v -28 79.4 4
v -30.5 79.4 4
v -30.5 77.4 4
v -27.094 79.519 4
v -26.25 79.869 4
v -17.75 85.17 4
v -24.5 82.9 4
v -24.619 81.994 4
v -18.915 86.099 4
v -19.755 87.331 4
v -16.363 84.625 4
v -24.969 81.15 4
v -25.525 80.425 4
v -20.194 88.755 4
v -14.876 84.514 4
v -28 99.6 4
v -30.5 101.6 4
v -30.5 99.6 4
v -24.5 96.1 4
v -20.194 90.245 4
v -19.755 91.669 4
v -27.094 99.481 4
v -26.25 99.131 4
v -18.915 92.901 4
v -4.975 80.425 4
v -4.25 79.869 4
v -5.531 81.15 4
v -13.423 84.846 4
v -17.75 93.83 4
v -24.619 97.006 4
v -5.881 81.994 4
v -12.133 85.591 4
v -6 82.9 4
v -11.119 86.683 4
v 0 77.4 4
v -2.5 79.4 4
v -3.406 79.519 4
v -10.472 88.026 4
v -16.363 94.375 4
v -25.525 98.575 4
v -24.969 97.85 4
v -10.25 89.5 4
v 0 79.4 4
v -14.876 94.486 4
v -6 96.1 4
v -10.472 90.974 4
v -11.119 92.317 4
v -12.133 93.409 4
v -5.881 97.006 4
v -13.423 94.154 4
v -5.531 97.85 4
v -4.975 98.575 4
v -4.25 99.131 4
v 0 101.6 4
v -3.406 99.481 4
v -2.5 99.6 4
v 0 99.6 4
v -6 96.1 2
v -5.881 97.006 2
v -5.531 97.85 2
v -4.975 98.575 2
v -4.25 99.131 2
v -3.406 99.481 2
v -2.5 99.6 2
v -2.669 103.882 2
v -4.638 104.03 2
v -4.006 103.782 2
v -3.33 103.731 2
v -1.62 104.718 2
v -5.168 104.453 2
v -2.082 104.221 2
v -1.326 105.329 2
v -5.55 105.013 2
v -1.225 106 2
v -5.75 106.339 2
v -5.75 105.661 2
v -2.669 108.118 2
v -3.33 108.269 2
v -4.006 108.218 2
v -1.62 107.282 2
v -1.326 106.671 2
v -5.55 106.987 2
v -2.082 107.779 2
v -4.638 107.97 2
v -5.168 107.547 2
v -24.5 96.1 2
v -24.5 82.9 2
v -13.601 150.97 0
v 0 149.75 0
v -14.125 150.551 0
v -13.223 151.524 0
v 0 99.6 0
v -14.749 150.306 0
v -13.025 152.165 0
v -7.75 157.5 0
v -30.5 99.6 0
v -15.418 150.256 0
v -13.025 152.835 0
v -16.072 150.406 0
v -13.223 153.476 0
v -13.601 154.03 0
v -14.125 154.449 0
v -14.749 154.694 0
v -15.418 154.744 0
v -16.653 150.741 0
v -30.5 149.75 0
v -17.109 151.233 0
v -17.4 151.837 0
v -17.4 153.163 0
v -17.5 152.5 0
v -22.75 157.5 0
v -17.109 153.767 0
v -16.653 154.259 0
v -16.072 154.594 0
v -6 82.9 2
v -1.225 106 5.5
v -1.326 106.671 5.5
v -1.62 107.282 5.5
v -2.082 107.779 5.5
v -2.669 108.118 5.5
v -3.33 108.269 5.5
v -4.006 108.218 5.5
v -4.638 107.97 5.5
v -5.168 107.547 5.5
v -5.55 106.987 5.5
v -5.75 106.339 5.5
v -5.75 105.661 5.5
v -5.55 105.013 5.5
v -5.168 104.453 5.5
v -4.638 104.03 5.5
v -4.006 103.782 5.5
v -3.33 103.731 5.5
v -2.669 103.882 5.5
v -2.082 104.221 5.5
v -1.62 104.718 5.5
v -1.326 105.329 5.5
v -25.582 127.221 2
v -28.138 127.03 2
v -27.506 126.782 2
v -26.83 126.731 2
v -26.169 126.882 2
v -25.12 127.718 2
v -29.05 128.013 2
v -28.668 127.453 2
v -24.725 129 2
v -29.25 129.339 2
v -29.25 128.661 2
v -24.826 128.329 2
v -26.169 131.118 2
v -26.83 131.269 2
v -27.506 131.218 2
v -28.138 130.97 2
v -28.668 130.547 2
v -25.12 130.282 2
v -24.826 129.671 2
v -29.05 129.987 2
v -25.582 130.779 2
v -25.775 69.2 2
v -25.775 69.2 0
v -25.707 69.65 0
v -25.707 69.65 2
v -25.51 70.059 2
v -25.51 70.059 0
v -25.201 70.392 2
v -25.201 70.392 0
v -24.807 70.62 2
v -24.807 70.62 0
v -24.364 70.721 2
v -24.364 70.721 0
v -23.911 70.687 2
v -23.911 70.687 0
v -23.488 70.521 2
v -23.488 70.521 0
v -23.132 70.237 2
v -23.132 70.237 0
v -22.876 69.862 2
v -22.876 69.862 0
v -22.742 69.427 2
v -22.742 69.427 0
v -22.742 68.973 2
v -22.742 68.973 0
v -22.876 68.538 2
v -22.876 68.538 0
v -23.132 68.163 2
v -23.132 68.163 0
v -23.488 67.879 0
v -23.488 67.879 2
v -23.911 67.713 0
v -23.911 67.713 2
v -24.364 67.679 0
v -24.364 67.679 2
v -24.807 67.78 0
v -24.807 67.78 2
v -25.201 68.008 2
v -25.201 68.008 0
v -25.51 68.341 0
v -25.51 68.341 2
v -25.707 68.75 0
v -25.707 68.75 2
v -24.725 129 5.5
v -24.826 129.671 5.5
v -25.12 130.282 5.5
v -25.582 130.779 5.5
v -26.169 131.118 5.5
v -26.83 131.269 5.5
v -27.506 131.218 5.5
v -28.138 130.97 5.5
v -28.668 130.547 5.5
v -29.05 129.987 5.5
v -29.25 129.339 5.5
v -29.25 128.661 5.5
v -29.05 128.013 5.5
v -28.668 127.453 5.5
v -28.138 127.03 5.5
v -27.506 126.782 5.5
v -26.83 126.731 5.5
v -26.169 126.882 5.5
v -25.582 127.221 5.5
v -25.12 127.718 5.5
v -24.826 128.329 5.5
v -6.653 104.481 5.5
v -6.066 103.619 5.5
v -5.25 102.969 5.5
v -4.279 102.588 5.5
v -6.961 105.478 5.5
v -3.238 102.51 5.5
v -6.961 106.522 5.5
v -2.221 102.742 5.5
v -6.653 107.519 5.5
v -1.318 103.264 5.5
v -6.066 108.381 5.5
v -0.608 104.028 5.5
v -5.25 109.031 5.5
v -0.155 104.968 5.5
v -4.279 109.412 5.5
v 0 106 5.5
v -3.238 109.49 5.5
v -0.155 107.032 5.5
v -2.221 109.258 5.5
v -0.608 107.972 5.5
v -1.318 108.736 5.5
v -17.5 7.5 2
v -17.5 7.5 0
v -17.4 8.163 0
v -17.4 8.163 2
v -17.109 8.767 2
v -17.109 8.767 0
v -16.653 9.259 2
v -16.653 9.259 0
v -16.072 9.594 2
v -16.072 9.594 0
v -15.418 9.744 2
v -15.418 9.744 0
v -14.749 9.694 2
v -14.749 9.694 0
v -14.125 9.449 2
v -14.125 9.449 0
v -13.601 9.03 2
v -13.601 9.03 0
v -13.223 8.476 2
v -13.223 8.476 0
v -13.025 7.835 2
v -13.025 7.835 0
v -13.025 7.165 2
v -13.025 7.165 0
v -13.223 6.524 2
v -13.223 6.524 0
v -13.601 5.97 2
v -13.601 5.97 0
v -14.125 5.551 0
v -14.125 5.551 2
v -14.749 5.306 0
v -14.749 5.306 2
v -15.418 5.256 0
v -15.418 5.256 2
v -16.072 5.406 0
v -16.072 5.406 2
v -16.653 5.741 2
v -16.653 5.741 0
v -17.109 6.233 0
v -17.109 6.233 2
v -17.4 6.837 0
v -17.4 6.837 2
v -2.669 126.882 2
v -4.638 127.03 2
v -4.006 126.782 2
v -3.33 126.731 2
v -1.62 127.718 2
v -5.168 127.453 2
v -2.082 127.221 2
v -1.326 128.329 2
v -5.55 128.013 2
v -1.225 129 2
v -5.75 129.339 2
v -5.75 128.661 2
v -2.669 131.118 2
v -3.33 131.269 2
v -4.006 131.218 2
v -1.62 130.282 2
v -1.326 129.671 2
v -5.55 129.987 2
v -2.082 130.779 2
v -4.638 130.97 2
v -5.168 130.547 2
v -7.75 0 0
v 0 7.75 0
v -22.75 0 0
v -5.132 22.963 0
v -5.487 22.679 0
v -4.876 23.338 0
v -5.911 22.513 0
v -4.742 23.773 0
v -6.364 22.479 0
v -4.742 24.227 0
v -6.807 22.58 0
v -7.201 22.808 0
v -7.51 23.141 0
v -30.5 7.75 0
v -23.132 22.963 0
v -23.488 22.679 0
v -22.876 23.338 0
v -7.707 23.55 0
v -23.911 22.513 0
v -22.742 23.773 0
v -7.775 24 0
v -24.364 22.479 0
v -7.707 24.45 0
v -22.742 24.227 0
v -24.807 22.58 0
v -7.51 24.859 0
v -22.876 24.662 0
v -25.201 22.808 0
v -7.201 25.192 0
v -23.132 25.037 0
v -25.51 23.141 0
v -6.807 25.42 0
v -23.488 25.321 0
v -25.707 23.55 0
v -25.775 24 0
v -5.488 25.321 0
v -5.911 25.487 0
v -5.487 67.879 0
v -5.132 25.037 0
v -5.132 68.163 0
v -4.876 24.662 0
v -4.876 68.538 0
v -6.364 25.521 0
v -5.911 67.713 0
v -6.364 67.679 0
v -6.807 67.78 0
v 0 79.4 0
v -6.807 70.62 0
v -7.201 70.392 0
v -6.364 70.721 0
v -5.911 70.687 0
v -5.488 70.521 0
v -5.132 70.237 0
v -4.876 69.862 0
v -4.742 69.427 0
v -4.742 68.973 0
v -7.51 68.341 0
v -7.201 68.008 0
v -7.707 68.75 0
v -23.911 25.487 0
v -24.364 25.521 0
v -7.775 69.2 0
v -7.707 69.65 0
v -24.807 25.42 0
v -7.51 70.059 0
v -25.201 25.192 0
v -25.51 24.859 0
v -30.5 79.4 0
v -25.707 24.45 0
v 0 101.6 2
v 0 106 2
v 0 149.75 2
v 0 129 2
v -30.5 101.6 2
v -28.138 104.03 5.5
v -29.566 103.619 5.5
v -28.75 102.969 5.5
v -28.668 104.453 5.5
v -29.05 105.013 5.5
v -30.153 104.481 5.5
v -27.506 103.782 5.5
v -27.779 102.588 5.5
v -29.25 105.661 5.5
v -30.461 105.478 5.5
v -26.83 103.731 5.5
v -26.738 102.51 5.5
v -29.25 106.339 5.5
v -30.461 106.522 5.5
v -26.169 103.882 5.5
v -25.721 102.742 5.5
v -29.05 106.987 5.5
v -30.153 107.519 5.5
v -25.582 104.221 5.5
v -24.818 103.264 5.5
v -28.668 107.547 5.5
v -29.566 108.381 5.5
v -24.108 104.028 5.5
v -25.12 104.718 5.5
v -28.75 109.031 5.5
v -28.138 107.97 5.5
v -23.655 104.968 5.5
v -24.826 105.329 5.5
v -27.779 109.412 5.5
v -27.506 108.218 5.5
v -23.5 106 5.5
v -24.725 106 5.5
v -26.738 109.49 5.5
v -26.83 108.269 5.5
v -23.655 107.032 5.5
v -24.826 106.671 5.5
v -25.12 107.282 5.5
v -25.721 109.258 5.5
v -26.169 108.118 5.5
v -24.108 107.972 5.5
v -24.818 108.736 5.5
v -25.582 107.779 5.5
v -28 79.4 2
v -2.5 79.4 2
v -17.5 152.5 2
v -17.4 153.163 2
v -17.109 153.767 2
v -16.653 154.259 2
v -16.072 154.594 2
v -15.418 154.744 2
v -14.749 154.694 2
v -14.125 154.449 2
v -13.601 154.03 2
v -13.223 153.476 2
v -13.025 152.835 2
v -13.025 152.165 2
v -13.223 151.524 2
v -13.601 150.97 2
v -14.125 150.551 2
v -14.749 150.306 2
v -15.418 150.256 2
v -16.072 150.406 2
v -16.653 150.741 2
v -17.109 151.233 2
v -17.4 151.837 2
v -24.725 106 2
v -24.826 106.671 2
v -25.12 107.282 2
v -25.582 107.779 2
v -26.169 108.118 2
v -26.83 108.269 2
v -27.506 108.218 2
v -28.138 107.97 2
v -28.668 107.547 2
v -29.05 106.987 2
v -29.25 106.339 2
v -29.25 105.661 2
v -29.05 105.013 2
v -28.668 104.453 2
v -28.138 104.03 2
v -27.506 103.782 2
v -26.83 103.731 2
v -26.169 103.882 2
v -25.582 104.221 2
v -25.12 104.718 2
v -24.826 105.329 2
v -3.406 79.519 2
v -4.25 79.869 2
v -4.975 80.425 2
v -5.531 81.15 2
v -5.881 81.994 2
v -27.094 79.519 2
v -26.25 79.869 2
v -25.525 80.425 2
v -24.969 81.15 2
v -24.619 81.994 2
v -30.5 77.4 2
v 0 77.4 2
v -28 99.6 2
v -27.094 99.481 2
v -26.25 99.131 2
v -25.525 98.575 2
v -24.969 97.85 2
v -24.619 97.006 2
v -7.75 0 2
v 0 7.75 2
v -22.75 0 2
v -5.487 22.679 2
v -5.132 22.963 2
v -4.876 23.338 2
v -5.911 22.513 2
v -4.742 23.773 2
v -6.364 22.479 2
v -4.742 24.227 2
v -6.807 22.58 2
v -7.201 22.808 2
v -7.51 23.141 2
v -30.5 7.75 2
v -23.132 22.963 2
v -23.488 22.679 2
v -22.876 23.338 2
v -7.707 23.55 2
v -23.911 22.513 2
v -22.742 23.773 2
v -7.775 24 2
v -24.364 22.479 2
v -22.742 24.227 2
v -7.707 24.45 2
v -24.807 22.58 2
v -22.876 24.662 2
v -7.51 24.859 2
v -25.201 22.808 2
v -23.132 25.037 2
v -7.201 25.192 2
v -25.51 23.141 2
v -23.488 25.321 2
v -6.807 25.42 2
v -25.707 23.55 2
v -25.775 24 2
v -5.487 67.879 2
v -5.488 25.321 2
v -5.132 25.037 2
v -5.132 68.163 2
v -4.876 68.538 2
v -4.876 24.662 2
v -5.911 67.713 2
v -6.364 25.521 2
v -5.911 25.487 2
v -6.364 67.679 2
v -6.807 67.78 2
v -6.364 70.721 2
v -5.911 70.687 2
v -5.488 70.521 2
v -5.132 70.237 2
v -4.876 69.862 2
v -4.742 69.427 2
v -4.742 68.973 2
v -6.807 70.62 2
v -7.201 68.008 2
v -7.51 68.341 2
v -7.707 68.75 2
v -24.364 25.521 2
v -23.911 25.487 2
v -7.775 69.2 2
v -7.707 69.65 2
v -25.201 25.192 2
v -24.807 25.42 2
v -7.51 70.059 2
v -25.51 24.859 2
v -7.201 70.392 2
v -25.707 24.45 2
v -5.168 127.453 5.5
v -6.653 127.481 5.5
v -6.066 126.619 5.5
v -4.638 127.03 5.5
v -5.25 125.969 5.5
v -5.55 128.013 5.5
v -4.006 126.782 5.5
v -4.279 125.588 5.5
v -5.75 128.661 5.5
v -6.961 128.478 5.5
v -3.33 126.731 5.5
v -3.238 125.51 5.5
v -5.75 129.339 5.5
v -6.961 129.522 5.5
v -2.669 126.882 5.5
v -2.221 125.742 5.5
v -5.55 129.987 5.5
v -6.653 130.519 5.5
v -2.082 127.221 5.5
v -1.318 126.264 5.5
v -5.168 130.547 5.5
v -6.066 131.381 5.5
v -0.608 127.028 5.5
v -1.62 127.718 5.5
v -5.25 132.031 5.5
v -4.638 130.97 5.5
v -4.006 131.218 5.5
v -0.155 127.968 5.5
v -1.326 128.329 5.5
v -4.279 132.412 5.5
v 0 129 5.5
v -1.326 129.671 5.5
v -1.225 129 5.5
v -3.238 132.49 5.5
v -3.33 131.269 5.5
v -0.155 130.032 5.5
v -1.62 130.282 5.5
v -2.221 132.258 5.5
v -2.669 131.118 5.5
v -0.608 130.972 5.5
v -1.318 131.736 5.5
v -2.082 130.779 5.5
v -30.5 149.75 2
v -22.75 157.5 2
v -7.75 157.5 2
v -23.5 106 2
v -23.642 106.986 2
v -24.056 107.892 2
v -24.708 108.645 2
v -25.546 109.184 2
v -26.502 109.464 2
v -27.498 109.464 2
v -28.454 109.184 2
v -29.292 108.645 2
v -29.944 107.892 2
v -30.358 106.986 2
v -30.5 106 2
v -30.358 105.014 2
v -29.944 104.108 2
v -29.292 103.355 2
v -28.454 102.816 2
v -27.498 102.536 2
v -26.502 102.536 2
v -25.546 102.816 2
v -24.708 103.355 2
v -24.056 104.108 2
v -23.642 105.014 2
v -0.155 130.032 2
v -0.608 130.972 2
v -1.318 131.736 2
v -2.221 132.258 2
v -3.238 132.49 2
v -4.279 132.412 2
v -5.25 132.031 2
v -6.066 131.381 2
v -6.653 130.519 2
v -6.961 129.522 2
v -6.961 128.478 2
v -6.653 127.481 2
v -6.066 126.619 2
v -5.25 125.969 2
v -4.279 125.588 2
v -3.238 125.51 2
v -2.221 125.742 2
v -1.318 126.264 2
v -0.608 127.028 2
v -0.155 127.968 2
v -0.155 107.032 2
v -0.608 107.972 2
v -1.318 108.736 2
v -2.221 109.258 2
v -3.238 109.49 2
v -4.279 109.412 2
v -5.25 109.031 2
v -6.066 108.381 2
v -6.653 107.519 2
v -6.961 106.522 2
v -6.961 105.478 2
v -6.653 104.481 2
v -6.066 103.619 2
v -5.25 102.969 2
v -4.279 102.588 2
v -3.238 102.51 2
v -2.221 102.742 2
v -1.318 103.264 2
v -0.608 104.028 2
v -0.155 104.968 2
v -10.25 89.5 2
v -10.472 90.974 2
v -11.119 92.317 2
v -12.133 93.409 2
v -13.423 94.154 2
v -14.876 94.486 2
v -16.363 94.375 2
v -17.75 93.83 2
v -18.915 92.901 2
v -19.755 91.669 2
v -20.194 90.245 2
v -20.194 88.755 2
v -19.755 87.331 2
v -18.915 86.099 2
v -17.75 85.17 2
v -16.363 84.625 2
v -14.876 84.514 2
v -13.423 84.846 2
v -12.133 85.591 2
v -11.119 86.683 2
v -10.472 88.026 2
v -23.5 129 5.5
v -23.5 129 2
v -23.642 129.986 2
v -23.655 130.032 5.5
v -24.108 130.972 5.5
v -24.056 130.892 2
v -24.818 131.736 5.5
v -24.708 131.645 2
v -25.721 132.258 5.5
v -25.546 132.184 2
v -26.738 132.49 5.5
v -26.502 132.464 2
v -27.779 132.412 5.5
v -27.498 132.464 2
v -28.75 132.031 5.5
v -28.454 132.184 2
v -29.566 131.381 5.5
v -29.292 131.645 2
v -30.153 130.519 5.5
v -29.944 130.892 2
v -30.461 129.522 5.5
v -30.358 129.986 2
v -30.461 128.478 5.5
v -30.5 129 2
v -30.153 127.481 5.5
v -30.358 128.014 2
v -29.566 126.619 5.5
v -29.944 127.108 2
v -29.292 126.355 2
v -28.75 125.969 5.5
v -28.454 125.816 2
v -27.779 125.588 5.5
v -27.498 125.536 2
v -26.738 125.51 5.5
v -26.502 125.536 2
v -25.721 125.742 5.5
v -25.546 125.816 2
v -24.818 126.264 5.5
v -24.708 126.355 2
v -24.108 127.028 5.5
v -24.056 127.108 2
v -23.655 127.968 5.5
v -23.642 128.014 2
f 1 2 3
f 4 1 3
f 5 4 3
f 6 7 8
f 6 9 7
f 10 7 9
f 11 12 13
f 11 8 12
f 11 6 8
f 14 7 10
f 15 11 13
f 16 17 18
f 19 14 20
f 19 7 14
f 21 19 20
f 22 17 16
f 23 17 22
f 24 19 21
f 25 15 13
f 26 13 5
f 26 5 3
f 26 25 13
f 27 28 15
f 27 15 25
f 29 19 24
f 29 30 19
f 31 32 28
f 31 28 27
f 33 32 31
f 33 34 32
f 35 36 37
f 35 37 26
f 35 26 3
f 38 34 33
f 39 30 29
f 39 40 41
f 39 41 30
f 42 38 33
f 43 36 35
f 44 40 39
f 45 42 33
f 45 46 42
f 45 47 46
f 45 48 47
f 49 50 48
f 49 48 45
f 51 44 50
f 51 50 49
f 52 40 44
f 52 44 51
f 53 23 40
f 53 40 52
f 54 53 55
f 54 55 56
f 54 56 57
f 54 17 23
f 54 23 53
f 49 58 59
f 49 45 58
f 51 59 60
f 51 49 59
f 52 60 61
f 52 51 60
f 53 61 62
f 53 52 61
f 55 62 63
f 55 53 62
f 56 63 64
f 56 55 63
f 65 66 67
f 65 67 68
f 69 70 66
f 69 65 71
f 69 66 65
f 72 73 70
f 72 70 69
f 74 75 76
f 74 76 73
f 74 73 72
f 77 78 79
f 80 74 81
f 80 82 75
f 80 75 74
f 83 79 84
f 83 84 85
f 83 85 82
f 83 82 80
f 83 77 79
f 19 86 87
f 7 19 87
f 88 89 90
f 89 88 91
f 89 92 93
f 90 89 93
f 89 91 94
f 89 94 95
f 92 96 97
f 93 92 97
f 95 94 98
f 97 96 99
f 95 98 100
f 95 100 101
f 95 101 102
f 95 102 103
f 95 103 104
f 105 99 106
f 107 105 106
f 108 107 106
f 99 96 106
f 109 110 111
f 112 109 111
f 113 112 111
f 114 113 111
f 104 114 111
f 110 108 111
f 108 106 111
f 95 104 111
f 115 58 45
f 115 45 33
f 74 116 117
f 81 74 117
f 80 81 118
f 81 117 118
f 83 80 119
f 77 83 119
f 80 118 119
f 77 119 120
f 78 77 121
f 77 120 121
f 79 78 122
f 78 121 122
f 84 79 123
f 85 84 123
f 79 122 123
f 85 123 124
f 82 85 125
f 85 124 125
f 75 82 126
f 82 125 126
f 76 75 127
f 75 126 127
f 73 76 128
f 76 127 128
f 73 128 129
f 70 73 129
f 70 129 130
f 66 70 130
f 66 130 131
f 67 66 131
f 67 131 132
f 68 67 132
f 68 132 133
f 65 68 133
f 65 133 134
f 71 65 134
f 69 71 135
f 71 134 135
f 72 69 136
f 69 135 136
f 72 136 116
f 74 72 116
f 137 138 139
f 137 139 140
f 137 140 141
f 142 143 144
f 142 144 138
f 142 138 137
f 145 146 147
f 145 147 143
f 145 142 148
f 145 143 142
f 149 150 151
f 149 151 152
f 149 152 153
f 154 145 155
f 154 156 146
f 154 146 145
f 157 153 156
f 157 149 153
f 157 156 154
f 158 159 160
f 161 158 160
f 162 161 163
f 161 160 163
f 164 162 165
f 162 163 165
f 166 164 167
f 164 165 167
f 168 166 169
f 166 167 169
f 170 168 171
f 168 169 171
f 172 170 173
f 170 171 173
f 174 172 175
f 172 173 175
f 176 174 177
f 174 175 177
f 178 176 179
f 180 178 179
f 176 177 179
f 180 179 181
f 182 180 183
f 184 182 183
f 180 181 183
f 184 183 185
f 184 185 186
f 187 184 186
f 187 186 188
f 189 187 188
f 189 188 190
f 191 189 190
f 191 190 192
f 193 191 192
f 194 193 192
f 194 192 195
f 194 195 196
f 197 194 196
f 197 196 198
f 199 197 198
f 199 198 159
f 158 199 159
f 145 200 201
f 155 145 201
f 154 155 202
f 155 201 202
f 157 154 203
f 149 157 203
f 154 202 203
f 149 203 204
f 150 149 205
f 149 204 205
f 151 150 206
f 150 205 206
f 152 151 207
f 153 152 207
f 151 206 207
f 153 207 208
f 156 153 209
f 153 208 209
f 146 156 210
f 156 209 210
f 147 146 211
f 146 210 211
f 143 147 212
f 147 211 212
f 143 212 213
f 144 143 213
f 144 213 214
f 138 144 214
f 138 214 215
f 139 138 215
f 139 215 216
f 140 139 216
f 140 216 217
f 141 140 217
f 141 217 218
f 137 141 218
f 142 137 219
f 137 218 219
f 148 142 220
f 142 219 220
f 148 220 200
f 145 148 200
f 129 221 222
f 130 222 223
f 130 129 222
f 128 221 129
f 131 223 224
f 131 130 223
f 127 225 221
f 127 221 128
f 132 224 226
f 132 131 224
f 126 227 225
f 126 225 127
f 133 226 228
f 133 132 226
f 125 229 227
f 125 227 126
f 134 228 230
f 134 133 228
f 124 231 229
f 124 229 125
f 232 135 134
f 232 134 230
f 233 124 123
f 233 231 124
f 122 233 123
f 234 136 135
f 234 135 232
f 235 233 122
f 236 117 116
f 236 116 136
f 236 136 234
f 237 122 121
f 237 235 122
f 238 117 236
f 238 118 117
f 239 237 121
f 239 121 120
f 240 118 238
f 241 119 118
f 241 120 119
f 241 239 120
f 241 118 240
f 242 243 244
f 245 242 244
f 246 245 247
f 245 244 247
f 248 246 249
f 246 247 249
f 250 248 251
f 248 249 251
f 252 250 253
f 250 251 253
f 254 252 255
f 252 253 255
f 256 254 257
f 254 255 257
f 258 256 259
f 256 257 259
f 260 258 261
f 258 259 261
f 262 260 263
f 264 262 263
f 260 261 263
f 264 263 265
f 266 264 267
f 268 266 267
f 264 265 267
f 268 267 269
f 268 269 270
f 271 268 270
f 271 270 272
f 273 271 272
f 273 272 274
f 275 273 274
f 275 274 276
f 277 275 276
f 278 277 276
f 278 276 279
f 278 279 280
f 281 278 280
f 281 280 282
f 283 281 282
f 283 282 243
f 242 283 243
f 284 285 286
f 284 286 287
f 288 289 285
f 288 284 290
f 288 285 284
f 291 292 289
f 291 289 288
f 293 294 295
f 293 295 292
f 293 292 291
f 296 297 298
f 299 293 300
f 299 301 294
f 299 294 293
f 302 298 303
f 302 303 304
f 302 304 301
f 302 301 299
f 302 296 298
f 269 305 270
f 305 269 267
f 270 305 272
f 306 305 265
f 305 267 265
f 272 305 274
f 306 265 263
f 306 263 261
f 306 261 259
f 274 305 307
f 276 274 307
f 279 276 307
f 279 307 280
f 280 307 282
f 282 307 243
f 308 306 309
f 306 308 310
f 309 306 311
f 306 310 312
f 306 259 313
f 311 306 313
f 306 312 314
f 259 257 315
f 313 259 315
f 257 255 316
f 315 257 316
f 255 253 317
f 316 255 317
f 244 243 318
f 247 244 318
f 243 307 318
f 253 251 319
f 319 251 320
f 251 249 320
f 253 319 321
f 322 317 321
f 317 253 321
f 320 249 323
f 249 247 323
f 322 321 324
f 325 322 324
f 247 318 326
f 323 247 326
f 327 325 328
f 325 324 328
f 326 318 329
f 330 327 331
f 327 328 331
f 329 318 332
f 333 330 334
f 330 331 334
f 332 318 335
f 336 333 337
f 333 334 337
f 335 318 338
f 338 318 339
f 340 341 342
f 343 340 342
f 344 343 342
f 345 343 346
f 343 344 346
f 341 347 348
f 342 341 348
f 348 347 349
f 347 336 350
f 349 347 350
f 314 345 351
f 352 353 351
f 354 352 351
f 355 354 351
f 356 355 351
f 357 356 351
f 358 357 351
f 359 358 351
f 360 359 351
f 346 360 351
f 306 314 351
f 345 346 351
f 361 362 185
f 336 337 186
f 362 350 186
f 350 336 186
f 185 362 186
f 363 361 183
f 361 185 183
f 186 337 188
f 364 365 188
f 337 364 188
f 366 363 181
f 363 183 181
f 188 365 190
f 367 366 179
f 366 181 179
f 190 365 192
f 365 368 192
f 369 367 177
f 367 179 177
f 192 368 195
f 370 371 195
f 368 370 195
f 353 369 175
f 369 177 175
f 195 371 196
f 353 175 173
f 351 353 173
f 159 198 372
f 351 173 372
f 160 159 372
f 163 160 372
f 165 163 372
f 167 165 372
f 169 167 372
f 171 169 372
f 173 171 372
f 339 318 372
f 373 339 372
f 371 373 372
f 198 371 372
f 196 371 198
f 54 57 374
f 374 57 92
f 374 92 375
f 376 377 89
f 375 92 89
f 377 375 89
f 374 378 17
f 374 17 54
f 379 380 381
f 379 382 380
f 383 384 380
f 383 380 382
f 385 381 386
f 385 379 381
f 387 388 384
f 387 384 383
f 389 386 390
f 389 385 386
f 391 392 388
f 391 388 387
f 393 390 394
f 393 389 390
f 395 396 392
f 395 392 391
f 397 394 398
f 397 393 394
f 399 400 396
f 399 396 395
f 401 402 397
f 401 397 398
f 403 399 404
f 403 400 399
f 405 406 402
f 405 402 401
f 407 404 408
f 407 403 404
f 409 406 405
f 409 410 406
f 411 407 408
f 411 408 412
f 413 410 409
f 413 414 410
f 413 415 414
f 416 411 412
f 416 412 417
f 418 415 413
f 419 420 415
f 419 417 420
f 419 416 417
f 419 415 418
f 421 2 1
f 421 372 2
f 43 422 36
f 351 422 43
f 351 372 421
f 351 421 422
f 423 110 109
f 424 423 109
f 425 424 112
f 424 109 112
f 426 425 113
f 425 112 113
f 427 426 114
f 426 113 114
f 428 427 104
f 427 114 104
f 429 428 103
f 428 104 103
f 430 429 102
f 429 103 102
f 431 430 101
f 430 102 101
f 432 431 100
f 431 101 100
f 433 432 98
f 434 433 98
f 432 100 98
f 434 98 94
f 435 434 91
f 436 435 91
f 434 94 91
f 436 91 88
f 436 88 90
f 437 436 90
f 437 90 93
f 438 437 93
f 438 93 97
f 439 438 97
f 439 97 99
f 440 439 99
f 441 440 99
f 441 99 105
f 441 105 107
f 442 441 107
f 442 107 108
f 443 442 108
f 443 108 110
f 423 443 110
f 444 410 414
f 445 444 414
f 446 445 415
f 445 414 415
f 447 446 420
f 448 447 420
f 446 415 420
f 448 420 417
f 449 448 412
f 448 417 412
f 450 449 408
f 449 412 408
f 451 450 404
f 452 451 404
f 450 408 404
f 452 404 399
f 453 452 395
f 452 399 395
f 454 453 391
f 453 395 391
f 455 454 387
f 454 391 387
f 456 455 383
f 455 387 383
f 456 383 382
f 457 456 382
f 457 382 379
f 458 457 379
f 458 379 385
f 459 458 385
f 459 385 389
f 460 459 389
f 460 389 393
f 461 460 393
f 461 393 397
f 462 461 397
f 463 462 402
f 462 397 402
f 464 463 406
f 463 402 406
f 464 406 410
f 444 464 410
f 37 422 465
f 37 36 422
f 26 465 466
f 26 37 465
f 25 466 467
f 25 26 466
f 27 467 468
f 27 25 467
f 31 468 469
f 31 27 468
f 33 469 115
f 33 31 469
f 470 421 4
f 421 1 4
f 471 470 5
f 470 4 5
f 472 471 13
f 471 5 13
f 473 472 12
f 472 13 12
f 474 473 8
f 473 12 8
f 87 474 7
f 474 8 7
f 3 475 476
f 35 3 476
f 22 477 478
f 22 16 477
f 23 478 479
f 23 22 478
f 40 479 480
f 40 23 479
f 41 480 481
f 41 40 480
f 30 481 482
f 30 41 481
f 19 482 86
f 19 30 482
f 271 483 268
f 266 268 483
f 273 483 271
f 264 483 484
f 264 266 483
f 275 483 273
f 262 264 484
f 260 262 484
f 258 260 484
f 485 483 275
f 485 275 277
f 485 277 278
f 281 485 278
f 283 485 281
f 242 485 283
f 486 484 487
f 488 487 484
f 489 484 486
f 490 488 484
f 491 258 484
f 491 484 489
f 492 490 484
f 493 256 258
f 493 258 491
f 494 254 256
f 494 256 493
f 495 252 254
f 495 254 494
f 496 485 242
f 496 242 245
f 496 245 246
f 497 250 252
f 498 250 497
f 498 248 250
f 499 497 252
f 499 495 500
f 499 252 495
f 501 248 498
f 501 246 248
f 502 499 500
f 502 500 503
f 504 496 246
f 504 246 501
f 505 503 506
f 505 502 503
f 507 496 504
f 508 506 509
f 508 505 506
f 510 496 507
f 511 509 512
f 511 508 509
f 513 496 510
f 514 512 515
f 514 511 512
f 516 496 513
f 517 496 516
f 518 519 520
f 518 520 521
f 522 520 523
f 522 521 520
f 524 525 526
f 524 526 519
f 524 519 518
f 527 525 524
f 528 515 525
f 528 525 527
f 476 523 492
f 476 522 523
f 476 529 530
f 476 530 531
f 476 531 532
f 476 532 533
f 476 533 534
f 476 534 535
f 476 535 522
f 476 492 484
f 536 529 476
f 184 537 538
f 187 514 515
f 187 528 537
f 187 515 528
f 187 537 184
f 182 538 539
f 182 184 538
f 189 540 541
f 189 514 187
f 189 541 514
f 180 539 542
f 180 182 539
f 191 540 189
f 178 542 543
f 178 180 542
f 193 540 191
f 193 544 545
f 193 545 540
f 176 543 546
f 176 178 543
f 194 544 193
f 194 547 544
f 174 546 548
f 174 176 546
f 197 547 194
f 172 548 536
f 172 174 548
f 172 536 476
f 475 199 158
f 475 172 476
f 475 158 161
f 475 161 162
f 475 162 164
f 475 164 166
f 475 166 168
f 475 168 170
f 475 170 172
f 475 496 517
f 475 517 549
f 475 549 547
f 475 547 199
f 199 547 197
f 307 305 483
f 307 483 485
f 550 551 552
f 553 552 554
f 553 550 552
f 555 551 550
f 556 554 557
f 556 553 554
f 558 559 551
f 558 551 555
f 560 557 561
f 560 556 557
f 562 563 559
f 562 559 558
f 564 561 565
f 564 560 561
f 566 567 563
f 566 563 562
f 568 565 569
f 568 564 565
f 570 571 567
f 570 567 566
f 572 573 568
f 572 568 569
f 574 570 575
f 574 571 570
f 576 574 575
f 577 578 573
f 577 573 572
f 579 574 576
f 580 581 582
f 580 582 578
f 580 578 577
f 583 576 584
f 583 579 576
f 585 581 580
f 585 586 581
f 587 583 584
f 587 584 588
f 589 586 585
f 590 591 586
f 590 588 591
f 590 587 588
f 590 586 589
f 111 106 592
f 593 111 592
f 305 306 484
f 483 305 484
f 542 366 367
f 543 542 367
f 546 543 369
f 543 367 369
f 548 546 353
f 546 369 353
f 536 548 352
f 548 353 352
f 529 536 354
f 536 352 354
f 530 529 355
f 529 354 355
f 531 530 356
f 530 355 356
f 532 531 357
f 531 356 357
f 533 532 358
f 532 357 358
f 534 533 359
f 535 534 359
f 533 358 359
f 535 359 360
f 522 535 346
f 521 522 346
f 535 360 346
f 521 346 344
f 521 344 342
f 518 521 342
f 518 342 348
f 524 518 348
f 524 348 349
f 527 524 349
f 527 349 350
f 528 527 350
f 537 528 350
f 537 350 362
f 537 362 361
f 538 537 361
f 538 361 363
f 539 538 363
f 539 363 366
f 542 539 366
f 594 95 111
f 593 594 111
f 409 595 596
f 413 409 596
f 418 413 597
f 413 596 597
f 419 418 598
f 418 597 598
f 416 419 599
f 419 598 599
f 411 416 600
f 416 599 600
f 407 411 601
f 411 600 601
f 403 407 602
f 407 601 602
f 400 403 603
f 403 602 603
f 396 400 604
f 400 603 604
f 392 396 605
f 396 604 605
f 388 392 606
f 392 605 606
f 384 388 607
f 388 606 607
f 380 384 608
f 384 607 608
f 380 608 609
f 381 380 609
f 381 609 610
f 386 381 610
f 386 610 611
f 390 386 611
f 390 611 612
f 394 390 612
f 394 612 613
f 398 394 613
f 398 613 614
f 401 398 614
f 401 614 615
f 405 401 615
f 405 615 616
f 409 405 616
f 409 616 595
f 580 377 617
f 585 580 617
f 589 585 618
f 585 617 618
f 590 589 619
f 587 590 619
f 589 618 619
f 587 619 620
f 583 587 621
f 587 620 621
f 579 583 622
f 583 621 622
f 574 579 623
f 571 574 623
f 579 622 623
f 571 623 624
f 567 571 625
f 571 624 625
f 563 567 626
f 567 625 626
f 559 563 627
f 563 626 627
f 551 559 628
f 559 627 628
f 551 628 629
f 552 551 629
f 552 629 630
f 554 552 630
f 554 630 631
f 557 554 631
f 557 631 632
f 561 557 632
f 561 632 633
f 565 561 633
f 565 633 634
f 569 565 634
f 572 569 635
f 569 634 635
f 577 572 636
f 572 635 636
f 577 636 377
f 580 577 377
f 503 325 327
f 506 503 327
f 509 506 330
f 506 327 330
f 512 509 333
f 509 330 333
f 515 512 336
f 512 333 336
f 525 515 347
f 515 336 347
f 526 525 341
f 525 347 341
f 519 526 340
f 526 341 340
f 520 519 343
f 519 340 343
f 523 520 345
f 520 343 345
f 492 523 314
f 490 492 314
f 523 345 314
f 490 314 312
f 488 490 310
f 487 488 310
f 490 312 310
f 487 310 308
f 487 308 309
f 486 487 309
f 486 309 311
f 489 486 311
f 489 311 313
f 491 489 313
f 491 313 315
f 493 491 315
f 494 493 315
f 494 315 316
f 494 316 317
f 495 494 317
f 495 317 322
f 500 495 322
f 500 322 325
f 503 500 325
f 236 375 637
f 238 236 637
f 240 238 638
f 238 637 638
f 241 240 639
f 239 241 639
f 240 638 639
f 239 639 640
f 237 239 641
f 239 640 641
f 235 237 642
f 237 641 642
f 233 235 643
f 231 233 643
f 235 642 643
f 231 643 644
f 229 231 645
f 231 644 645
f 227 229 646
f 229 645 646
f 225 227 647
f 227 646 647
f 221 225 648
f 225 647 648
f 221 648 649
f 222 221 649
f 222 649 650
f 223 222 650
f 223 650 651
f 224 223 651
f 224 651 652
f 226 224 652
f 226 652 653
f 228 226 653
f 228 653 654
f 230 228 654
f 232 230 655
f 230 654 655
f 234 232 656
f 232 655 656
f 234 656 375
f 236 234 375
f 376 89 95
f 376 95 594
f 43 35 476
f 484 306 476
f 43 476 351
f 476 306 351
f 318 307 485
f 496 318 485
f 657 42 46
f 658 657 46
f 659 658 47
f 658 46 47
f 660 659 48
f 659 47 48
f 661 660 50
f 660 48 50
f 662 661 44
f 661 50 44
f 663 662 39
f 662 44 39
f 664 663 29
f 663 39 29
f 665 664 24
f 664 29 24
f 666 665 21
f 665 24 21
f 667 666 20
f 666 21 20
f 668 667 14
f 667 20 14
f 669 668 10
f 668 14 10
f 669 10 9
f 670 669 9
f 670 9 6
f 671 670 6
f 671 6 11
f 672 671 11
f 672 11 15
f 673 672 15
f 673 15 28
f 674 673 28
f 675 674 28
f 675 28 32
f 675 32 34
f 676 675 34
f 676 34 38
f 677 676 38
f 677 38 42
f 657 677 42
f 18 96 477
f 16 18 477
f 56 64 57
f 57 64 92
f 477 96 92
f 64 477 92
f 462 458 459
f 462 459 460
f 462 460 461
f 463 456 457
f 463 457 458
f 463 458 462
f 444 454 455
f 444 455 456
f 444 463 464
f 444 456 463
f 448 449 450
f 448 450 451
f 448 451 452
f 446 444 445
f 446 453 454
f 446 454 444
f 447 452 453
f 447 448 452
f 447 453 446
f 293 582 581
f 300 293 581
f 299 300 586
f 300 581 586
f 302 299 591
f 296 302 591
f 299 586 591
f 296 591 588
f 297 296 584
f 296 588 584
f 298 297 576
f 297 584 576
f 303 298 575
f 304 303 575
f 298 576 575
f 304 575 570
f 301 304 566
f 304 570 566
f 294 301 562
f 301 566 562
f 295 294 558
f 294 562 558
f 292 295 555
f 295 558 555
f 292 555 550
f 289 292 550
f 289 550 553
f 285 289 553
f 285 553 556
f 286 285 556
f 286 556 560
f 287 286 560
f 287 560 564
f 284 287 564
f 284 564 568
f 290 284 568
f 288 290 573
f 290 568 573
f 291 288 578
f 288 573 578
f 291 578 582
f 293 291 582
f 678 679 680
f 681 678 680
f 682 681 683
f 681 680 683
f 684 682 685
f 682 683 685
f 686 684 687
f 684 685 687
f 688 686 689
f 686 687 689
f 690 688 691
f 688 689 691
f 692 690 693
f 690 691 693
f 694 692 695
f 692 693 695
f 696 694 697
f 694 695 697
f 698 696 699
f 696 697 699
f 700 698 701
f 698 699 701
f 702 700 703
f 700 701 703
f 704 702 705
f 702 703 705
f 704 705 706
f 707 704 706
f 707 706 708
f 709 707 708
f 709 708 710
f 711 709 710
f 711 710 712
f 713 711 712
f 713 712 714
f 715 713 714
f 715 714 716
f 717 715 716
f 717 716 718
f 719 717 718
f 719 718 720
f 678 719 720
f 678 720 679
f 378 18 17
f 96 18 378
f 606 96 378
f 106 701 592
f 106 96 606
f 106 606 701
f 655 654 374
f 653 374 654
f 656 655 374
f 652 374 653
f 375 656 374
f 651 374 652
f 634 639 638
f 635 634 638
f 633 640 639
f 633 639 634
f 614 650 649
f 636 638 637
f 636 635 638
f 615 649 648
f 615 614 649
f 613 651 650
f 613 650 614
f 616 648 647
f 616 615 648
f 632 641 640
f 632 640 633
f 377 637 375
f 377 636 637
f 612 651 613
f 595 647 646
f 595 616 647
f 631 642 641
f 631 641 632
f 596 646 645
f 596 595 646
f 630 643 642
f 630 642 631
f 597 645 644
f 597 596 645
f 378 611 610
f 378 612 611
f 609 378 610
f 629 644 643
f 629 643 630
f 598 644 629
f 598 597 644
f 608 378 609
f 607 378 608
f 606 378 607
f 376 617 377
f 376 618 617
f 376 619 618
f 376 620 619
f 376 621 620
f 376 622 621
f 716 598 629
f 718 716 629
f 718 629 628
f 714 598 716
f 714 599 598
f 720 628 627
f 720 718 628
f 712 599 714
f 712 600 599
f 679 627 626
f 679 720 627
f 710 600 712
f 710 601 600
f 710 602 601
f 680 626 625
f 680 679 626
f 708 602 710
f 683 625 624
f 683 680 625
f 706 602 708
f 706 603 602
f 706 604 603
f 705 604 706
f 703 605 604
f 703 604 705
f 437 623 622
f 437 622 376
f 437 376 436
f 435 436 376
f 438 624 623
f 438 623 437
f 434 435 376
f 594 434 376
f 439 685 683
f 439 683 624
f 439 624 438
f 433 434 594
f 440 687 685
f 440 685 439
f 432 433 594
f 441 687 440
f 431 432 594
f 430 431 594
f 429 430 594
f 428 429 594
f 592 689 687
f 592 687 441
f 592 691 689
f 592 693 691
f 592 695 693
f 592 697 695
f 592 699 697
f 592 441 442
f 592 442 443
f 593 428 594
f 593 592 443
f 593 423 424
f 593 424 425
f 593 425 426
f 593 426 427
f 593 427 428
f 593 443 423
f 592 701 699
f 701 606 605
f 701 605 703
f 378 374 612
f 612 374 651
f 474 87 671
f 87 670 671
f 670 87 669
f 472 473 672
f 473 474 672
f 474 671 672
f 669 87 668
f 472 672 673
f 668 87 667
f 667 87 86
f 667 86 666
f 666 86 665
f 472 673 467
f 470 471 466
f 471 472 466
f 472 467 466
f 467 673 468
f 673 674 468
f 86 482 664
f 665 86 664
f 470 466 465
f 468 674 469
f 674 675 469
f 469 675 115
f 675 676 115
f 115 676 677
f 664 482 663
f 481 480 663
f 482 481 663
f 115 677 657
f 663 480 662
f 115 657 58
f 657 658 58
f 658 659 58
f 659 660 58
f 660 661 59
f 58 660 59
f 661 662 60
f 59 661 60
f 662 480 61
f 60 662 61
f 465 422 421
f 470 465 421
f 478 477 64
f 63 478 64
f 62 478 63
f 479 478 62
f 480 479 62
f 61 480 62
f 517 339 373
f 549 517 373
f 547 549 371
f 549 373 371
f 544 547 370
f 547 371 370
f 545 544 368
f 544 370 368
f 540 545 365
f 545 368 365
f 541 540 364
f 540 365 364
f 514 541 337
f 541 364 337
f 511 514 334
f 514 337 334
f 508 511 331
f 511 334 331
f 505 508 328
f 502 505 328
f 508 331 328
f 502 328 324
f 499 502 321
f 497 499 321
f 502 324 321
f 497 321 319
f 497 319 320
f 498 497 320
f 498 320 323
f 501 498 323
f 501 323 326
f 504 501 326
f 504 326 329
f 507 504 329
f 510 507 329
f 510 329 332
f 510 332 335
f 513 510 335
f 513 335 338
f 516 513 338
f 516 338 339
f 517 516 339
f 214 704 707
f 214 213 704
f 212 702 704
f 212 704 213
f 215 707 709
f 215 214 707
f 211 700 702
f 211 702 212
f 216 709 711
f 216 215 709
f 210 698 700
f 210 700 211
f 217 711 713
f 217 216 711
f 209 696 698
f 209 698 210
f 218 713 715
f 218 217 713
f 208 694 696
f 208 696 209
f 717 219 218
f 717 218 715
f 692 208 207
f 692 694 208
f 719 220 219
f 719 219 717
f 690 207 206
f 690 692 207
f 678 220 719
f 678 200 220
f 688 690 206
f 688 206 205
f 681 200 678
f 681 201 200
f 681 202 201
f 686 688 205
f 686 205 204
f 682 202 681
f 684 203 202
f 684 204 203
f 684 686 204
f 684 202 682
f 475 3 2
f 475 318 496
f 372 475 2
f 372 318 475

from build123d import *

# Parameters (mm, degrees)
SKETCH_1_W                   = 157.5
SKETCH_1_H                   = 30.5
EXTRUDE_1_DEPTH              = 2
HOLE_WIZARD_4_5_3_05_1_D     = 3.05
HOLE_WIZARD_4_5_3_05_1_DEPTH = 2.5
SKETCH_4_R                   = 3.5
EXTRUDE_2_DEPTH              = 3.5
SKETCH_5_R                   = 2.275
CUT_EXTRUDE_1_DEPTH          = 3.5
SKETCH_6_W                   = 30.5
SKETCH_6_H                   = 20.2
CUT_EXTRUDE_3_DEPTH          = 2.1
SKETCH_9_W                   = 30.5
SKETCH_9_H                   = 24.2
EXTRUDE_6_DEPTH              = 2
SKETCH_12_R                  = 5
CUT_EXTRUDE_4_DEPTH          = 6.5
HOLE_WIZARD_M4_1_D           = 4.5
SKETCH_13_W                  = 6
SKETCH_13_H                  = 20.2
CUT_EXTRUDE_5_DEPTH          = 4.5
FILLET_8_R                   = 3.5
CHAMFER_1_SIZE               = 7.75


with BuildPart() as part:
    # ｽｹｯﾁ1 → ﾎﾞｽ - 押し出し1 (new body)
    with BuildSketch(Plane(origin=(0, 0, 0), x_dir=(0, 1, 0), z_dir=(0, 0, 1))):
        with Locations((78.75, 15.25)):
            Rectangle(SKETCH_1_W, SKETCH_1_H)
    extrude(amount=EXTRUDE_1_DEPTH)

    # Ø4.5 (3.05) 直径の穴1
    with Locations(Plane.XY.offset(2)):
        with Locations((-24.25, 24), (-6.25, 69.2), (-24.25, 69.2), (-6.25, 24)):
            Hole(HOLE_WIZARD_4_5_3_05_1_D / 2, depth=HOLE_WIZARD_4_5_3_05_1_DEPTH)

    # ｽｹｯﾁ4 → ﾎﾞｽ - 押し出し2 (add)
    with BuildSketch(Plane.XY.offset(2)):
        with Locations((-27, 129)):
            Circle(SKETCH_4_R)
        with Locations((-3.5, 129)):
            Circle(SKETCH_4_R)
        with Locations((-3.5, 106)):
            Circle(SKETCH_4_R)
        with Locations((-27, 106)):
            Circle(SKETCH_4_R)
    extrude(amount=EXTRUDE_2_DEPTH)

    # ｽｹｯﾁ5 → ｶｯﾄ - 押し出し1 (cut)
    with BuildSketch(Plane.XY.offset(5.5)):
        with Locations((-27, 129)):
            Circle(SKETCH_5_R)
        with Locations((-3.5, 129)):
            Circle(SKETCH_5_R)
        with Locations((-3.5, 106)):
            Circle(SKETCH_5_R)
        with Locations((-27, 106)):
            Circle(SKETCH_5_R)
    extrude(amount=-CUT_EXTRUDE_1_DEPTH, mode=Mode.SUBTRACT)

    # ｽｹｯﾁ6 → ｶｯﾄ - 押し出し3 (cut)
    with BuildSketch(Plane(origin=(0, 0, 0), x_dir=(1, 0, 0), z_dir=(0, 0, -1))):
        with Locations((-15.25, -89.5)):
            Rectangle(SKETCH_6_W, SKETCH_6_H)
    extrude(amount=-CUT_EXTRUDE_3_DEPTH, mode=Mode.SUBTRACT)

    # ｽｹｯﾁ9 → ﾎﾞｽ - 押し出し6 (add)
    with BuildSketch(Plane.XY.offset(2)):
        with Locations((-15.25, 89.5)):
            Rectangle(SKETCH_9_W, SKETCH_9_H)
    extrude(amount=EXTRUDE_6_DEPTH)

    # ｽｹｯﾁ12 → ｶｯﾄ - 押し出し4 (cut, through all)
    with BuildSketch(Plane.XY.offset(5.5)):
        with Locations((-15.25, 89.5)):
            Circle(SKETCH_12_R)
    extrude(amount=-CUT_EXTRUDE_4_DEPTH, mode=Mode.SUBTRACT)

    # M4 すきま穴1 (through all)
    with Locations(Plane.XY.offset(2)):
        with Locations((-15.25, 152.5), (-15.25, 7.5)):
            Hole(HOLE_WIZARD_M4_1_D / 2)

    # ｽｹｯﾁ13 → ｶｯﾄ - 押し出し5 (cut, through all)
    with BuildSketch(Plane(origin=(0, 0, 2), x_dir=(1, 0, 0), z_dir=(0, 0, -1))):
        with Locations((-3, -89.5)):
            Rectangle(SKETCH_13_W, SKETCH_13_H)
        with Locations((-27.5, -89.5)):
            Rectangle(SKETCH_13_W, SKETCH_13_H)
    extrude(amount=-CUT_EXTRUDE_5_DEPTH, mode=Mode.SUBTRACT)

    # ﾌｨﾚｯﾄ8
    fillet_8_edges = [part.edges().sort_by_distance(p)[0] for p in [
        (-6, 99.6, 3),
        (-6, 79.4, 3),
        (-24.5, 79.4, 3),
        (-24.5, 99.6, 3),
    ]]
    fillet(fillet_8_edges, radius=FILLET_8_R)

    # 面取り1
    chamfer_1_edges = [part.edges().sort_by_distance(p)[0] for p in [
        (0, 157.5, 1),
        (-30.5, 157.5, 1),
        (-30.5, 0, 1),
        (0, 0, 1),
    ]]
    chamfer(chamfer_1_edges, length=CHAMFER_1_SIZE)


solid = part.part
